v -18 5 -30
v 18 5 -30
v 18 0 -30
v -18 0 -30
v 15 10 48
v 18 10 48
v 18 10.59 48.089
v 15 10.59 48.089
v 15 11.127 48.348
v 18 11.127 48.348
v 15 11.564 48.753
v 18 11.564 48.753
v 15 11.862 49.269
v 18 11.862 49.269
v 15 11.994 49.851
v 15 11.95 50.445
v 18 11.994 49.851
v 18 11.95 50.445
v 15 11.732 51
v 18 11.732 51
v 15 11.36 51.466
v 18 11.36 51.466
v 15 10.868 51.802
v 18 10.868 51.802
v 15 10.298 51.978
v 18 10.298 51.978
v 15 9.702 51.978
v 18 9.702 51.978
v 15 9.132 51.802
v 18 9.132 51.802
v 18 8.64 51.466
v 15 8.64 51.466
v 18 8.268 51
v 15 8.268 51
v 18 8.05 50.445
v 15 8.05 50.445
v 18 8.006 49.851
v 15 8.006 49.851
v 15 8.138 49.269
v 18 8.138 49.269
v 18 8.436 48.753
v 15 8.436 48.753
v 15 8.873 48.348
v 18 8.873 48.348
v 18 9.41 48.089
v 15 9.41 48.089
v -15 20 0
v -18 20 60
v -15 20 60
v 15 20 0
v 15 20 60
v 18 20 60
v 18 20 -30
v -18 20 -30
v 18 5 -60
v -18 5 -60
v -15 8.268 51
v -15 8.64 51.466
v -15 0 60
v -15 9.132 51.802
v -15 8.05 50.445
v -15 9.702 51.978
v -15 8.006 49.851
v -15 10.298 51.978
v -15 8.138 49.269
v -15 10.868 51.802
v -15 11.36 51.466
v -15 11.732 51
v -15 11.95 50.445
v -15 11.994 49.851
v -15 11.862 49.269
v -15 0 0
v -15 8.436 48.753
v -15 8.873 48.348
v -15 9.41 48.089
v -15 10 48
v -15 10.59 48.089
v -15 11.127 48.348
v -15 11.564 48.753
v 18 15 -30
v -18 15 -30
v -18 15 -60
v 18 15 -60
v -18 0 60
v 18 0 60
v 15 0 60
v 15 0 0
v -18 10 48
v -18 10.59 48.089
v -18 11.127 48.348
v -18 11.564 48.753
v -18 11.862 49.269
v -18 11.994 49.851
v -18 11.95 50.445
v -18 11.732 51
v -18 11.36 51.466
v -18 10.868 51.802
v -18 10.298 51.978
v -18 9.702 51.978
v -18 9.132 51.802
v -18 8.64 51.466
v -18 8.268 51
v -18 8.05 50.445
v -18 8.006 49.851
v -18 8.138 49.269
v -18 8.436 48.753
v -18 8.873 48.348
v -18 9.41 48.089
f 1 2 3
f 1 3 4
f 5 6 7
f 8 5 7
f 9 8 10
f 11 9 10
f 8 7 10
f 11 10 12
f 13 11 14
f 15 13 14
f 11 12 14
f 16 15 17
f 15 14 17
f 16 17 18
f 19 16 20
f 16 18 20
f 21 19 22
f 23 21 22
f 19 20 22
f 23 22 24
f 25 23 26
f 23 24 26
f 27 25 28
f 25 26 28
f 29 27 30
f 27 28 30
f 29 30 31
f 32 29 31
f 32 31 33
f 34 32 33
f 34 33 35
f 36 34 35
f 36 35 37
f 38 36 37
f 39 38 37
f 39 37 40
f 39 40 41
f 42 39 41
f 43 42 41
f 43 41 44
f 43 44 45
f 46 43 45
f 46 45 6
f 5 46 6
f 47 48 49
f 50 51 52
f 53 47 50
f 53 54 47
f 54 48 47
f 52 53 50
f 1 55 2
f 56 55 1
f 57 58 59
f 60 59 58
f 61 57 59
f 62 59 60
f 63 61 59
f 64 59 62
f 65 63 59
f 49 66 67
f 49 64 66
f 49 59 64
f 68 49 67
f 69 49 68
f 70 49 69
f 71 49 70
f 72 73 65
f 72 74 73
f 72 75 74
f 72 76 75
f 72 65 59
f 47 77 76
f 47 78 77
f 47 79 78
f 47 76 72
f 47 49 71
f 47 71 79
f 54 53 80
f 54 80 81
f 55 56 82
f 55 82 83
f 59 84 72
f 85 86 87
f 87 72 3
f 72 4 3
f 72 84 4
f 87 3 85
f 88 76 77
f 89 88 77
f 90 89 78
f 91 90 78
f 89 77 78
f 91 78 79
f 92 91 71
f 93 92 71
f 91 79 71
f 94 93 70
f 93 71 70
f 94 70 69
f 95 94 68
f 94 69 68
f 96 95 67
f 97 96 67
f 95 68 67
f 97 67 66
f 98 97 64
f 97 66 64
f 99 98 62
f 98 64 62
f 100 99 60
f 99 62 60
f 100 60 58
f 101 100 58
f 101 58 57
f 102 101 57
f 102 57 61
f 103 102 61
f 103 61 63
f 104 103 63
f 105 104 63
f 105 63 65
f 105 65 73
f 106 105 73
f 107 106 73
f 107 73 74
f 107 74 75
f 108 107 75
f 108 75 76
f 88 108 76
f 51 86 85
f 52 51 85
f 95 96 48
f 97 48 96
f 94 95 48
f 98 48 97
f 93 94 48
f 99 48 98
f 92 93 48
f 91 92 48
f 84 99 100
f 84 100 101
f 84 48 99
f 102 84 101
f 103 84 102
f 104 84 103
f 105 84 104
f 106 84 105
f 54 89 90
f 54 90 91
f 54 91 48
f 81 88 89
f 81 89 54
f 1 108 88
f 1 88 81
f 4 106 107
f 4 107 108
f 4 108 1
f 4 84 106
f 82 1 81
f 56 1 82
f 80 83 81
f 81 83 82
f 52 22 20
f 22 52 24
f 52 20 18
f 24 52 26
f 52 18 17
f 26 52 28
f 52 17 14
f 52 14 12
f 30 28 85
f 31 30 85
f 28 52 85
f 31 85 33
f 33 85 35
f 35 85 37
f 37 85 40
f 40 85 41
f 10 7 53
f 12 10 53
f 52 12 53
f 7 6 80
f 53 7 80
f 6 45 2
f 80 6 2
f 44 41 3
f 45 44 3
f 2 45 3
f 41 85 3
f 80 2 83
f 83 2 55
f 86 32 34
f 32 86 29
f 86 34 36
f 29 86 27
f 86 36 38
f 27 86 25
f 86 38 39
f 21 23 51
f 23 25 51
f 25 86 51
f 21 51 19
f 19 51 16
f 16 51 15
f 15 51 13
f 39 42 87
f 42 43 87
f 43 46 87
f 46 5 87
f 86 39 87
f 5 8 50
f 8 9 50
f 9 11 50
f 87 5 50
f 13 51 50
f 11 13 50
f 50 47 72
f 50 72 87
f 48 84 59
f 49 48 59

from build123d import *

# Parameters (mm, degrees)
SKETCH_1_W          = 36
SKETCH_1_H          = 120
EXTRUDE_1_DEPTH     = 20
SKETCH_2_W          = 30
SKETCH_2_H          = 76.64229125
CUT_EXTRUDE_1_DEPTH = 20
SKETCH_3_W          = 53.751349406
SKETCH_3_H          = 17.737070837
SKETCH_3_W_2        = 54.426052537
SKETCH_3_H_2        = 11.321534577
CUT_EXTRUDE_2_DEPTH = 30
SKETCH_5_R          = 2
CUT_EXTRUDE_3_DEPTH = 70


with BuildPart() as part:
    # 草图1 → 凸台-拉伸1 (new body)
    with BuildSketch(Plane(origin=(0, 0, 0), x_dir=(1, 0, 0), z_dir=(0, 1, 0))):
        Rectangle(SKETCH_1_W, SKETCH_1_H)
    extrude(amount=EXTRUDE_1_DEPTH)

    # 草图2 → 切除-拉伸1 (cut)
    with BuildSketch(Plane(origin=(0, 20, 0), x_dir=(1, 0, 0), z_dir=(0, 1, 0))):
        with Locations((0, -38.321145625)):
            Rectangle(SKETCH_2_W, SKETCH_2_H)
    extrude(amount=-CUT_EXTRUDE_1_DEPTH, mode=Mode.SUBTRACT)

    # 草图3 → 切除-拉伸2 (cut)
    with BuildSketch(Plane(origin=(0, 0, -60), x_dir=(-1, 0, 0), z_dir=(0, 0, -1))):
        with Locations((-0.187417536, -3.868535419)):
            Rectangle(SKETCH_3_W, SKETCH_3_H)
        with Locations((0.074967015, 20.660767289)):
            Rectangle(SKETCH_3_W_2, SKETCH_3_H_2)
    extrude(amount=-CUT_EXTRUDE_2_DEPTH, mode=Mode.SUBTRACT)

    # 草图5 → 切除-拉伸3 (cut)
    with BuildSketch(Plane(origin=(18, 0, 0), x_dir=(0, 0, -1), z_dir=(1, 0, 0))):
        with Locations((-50, 10)):
            Circle(SKETCH_5_R)
    extrude(amount=-CUT_EXTRUDE_3_DEPTH, mode=Mode.SUBTRACT)


solid = part.part
